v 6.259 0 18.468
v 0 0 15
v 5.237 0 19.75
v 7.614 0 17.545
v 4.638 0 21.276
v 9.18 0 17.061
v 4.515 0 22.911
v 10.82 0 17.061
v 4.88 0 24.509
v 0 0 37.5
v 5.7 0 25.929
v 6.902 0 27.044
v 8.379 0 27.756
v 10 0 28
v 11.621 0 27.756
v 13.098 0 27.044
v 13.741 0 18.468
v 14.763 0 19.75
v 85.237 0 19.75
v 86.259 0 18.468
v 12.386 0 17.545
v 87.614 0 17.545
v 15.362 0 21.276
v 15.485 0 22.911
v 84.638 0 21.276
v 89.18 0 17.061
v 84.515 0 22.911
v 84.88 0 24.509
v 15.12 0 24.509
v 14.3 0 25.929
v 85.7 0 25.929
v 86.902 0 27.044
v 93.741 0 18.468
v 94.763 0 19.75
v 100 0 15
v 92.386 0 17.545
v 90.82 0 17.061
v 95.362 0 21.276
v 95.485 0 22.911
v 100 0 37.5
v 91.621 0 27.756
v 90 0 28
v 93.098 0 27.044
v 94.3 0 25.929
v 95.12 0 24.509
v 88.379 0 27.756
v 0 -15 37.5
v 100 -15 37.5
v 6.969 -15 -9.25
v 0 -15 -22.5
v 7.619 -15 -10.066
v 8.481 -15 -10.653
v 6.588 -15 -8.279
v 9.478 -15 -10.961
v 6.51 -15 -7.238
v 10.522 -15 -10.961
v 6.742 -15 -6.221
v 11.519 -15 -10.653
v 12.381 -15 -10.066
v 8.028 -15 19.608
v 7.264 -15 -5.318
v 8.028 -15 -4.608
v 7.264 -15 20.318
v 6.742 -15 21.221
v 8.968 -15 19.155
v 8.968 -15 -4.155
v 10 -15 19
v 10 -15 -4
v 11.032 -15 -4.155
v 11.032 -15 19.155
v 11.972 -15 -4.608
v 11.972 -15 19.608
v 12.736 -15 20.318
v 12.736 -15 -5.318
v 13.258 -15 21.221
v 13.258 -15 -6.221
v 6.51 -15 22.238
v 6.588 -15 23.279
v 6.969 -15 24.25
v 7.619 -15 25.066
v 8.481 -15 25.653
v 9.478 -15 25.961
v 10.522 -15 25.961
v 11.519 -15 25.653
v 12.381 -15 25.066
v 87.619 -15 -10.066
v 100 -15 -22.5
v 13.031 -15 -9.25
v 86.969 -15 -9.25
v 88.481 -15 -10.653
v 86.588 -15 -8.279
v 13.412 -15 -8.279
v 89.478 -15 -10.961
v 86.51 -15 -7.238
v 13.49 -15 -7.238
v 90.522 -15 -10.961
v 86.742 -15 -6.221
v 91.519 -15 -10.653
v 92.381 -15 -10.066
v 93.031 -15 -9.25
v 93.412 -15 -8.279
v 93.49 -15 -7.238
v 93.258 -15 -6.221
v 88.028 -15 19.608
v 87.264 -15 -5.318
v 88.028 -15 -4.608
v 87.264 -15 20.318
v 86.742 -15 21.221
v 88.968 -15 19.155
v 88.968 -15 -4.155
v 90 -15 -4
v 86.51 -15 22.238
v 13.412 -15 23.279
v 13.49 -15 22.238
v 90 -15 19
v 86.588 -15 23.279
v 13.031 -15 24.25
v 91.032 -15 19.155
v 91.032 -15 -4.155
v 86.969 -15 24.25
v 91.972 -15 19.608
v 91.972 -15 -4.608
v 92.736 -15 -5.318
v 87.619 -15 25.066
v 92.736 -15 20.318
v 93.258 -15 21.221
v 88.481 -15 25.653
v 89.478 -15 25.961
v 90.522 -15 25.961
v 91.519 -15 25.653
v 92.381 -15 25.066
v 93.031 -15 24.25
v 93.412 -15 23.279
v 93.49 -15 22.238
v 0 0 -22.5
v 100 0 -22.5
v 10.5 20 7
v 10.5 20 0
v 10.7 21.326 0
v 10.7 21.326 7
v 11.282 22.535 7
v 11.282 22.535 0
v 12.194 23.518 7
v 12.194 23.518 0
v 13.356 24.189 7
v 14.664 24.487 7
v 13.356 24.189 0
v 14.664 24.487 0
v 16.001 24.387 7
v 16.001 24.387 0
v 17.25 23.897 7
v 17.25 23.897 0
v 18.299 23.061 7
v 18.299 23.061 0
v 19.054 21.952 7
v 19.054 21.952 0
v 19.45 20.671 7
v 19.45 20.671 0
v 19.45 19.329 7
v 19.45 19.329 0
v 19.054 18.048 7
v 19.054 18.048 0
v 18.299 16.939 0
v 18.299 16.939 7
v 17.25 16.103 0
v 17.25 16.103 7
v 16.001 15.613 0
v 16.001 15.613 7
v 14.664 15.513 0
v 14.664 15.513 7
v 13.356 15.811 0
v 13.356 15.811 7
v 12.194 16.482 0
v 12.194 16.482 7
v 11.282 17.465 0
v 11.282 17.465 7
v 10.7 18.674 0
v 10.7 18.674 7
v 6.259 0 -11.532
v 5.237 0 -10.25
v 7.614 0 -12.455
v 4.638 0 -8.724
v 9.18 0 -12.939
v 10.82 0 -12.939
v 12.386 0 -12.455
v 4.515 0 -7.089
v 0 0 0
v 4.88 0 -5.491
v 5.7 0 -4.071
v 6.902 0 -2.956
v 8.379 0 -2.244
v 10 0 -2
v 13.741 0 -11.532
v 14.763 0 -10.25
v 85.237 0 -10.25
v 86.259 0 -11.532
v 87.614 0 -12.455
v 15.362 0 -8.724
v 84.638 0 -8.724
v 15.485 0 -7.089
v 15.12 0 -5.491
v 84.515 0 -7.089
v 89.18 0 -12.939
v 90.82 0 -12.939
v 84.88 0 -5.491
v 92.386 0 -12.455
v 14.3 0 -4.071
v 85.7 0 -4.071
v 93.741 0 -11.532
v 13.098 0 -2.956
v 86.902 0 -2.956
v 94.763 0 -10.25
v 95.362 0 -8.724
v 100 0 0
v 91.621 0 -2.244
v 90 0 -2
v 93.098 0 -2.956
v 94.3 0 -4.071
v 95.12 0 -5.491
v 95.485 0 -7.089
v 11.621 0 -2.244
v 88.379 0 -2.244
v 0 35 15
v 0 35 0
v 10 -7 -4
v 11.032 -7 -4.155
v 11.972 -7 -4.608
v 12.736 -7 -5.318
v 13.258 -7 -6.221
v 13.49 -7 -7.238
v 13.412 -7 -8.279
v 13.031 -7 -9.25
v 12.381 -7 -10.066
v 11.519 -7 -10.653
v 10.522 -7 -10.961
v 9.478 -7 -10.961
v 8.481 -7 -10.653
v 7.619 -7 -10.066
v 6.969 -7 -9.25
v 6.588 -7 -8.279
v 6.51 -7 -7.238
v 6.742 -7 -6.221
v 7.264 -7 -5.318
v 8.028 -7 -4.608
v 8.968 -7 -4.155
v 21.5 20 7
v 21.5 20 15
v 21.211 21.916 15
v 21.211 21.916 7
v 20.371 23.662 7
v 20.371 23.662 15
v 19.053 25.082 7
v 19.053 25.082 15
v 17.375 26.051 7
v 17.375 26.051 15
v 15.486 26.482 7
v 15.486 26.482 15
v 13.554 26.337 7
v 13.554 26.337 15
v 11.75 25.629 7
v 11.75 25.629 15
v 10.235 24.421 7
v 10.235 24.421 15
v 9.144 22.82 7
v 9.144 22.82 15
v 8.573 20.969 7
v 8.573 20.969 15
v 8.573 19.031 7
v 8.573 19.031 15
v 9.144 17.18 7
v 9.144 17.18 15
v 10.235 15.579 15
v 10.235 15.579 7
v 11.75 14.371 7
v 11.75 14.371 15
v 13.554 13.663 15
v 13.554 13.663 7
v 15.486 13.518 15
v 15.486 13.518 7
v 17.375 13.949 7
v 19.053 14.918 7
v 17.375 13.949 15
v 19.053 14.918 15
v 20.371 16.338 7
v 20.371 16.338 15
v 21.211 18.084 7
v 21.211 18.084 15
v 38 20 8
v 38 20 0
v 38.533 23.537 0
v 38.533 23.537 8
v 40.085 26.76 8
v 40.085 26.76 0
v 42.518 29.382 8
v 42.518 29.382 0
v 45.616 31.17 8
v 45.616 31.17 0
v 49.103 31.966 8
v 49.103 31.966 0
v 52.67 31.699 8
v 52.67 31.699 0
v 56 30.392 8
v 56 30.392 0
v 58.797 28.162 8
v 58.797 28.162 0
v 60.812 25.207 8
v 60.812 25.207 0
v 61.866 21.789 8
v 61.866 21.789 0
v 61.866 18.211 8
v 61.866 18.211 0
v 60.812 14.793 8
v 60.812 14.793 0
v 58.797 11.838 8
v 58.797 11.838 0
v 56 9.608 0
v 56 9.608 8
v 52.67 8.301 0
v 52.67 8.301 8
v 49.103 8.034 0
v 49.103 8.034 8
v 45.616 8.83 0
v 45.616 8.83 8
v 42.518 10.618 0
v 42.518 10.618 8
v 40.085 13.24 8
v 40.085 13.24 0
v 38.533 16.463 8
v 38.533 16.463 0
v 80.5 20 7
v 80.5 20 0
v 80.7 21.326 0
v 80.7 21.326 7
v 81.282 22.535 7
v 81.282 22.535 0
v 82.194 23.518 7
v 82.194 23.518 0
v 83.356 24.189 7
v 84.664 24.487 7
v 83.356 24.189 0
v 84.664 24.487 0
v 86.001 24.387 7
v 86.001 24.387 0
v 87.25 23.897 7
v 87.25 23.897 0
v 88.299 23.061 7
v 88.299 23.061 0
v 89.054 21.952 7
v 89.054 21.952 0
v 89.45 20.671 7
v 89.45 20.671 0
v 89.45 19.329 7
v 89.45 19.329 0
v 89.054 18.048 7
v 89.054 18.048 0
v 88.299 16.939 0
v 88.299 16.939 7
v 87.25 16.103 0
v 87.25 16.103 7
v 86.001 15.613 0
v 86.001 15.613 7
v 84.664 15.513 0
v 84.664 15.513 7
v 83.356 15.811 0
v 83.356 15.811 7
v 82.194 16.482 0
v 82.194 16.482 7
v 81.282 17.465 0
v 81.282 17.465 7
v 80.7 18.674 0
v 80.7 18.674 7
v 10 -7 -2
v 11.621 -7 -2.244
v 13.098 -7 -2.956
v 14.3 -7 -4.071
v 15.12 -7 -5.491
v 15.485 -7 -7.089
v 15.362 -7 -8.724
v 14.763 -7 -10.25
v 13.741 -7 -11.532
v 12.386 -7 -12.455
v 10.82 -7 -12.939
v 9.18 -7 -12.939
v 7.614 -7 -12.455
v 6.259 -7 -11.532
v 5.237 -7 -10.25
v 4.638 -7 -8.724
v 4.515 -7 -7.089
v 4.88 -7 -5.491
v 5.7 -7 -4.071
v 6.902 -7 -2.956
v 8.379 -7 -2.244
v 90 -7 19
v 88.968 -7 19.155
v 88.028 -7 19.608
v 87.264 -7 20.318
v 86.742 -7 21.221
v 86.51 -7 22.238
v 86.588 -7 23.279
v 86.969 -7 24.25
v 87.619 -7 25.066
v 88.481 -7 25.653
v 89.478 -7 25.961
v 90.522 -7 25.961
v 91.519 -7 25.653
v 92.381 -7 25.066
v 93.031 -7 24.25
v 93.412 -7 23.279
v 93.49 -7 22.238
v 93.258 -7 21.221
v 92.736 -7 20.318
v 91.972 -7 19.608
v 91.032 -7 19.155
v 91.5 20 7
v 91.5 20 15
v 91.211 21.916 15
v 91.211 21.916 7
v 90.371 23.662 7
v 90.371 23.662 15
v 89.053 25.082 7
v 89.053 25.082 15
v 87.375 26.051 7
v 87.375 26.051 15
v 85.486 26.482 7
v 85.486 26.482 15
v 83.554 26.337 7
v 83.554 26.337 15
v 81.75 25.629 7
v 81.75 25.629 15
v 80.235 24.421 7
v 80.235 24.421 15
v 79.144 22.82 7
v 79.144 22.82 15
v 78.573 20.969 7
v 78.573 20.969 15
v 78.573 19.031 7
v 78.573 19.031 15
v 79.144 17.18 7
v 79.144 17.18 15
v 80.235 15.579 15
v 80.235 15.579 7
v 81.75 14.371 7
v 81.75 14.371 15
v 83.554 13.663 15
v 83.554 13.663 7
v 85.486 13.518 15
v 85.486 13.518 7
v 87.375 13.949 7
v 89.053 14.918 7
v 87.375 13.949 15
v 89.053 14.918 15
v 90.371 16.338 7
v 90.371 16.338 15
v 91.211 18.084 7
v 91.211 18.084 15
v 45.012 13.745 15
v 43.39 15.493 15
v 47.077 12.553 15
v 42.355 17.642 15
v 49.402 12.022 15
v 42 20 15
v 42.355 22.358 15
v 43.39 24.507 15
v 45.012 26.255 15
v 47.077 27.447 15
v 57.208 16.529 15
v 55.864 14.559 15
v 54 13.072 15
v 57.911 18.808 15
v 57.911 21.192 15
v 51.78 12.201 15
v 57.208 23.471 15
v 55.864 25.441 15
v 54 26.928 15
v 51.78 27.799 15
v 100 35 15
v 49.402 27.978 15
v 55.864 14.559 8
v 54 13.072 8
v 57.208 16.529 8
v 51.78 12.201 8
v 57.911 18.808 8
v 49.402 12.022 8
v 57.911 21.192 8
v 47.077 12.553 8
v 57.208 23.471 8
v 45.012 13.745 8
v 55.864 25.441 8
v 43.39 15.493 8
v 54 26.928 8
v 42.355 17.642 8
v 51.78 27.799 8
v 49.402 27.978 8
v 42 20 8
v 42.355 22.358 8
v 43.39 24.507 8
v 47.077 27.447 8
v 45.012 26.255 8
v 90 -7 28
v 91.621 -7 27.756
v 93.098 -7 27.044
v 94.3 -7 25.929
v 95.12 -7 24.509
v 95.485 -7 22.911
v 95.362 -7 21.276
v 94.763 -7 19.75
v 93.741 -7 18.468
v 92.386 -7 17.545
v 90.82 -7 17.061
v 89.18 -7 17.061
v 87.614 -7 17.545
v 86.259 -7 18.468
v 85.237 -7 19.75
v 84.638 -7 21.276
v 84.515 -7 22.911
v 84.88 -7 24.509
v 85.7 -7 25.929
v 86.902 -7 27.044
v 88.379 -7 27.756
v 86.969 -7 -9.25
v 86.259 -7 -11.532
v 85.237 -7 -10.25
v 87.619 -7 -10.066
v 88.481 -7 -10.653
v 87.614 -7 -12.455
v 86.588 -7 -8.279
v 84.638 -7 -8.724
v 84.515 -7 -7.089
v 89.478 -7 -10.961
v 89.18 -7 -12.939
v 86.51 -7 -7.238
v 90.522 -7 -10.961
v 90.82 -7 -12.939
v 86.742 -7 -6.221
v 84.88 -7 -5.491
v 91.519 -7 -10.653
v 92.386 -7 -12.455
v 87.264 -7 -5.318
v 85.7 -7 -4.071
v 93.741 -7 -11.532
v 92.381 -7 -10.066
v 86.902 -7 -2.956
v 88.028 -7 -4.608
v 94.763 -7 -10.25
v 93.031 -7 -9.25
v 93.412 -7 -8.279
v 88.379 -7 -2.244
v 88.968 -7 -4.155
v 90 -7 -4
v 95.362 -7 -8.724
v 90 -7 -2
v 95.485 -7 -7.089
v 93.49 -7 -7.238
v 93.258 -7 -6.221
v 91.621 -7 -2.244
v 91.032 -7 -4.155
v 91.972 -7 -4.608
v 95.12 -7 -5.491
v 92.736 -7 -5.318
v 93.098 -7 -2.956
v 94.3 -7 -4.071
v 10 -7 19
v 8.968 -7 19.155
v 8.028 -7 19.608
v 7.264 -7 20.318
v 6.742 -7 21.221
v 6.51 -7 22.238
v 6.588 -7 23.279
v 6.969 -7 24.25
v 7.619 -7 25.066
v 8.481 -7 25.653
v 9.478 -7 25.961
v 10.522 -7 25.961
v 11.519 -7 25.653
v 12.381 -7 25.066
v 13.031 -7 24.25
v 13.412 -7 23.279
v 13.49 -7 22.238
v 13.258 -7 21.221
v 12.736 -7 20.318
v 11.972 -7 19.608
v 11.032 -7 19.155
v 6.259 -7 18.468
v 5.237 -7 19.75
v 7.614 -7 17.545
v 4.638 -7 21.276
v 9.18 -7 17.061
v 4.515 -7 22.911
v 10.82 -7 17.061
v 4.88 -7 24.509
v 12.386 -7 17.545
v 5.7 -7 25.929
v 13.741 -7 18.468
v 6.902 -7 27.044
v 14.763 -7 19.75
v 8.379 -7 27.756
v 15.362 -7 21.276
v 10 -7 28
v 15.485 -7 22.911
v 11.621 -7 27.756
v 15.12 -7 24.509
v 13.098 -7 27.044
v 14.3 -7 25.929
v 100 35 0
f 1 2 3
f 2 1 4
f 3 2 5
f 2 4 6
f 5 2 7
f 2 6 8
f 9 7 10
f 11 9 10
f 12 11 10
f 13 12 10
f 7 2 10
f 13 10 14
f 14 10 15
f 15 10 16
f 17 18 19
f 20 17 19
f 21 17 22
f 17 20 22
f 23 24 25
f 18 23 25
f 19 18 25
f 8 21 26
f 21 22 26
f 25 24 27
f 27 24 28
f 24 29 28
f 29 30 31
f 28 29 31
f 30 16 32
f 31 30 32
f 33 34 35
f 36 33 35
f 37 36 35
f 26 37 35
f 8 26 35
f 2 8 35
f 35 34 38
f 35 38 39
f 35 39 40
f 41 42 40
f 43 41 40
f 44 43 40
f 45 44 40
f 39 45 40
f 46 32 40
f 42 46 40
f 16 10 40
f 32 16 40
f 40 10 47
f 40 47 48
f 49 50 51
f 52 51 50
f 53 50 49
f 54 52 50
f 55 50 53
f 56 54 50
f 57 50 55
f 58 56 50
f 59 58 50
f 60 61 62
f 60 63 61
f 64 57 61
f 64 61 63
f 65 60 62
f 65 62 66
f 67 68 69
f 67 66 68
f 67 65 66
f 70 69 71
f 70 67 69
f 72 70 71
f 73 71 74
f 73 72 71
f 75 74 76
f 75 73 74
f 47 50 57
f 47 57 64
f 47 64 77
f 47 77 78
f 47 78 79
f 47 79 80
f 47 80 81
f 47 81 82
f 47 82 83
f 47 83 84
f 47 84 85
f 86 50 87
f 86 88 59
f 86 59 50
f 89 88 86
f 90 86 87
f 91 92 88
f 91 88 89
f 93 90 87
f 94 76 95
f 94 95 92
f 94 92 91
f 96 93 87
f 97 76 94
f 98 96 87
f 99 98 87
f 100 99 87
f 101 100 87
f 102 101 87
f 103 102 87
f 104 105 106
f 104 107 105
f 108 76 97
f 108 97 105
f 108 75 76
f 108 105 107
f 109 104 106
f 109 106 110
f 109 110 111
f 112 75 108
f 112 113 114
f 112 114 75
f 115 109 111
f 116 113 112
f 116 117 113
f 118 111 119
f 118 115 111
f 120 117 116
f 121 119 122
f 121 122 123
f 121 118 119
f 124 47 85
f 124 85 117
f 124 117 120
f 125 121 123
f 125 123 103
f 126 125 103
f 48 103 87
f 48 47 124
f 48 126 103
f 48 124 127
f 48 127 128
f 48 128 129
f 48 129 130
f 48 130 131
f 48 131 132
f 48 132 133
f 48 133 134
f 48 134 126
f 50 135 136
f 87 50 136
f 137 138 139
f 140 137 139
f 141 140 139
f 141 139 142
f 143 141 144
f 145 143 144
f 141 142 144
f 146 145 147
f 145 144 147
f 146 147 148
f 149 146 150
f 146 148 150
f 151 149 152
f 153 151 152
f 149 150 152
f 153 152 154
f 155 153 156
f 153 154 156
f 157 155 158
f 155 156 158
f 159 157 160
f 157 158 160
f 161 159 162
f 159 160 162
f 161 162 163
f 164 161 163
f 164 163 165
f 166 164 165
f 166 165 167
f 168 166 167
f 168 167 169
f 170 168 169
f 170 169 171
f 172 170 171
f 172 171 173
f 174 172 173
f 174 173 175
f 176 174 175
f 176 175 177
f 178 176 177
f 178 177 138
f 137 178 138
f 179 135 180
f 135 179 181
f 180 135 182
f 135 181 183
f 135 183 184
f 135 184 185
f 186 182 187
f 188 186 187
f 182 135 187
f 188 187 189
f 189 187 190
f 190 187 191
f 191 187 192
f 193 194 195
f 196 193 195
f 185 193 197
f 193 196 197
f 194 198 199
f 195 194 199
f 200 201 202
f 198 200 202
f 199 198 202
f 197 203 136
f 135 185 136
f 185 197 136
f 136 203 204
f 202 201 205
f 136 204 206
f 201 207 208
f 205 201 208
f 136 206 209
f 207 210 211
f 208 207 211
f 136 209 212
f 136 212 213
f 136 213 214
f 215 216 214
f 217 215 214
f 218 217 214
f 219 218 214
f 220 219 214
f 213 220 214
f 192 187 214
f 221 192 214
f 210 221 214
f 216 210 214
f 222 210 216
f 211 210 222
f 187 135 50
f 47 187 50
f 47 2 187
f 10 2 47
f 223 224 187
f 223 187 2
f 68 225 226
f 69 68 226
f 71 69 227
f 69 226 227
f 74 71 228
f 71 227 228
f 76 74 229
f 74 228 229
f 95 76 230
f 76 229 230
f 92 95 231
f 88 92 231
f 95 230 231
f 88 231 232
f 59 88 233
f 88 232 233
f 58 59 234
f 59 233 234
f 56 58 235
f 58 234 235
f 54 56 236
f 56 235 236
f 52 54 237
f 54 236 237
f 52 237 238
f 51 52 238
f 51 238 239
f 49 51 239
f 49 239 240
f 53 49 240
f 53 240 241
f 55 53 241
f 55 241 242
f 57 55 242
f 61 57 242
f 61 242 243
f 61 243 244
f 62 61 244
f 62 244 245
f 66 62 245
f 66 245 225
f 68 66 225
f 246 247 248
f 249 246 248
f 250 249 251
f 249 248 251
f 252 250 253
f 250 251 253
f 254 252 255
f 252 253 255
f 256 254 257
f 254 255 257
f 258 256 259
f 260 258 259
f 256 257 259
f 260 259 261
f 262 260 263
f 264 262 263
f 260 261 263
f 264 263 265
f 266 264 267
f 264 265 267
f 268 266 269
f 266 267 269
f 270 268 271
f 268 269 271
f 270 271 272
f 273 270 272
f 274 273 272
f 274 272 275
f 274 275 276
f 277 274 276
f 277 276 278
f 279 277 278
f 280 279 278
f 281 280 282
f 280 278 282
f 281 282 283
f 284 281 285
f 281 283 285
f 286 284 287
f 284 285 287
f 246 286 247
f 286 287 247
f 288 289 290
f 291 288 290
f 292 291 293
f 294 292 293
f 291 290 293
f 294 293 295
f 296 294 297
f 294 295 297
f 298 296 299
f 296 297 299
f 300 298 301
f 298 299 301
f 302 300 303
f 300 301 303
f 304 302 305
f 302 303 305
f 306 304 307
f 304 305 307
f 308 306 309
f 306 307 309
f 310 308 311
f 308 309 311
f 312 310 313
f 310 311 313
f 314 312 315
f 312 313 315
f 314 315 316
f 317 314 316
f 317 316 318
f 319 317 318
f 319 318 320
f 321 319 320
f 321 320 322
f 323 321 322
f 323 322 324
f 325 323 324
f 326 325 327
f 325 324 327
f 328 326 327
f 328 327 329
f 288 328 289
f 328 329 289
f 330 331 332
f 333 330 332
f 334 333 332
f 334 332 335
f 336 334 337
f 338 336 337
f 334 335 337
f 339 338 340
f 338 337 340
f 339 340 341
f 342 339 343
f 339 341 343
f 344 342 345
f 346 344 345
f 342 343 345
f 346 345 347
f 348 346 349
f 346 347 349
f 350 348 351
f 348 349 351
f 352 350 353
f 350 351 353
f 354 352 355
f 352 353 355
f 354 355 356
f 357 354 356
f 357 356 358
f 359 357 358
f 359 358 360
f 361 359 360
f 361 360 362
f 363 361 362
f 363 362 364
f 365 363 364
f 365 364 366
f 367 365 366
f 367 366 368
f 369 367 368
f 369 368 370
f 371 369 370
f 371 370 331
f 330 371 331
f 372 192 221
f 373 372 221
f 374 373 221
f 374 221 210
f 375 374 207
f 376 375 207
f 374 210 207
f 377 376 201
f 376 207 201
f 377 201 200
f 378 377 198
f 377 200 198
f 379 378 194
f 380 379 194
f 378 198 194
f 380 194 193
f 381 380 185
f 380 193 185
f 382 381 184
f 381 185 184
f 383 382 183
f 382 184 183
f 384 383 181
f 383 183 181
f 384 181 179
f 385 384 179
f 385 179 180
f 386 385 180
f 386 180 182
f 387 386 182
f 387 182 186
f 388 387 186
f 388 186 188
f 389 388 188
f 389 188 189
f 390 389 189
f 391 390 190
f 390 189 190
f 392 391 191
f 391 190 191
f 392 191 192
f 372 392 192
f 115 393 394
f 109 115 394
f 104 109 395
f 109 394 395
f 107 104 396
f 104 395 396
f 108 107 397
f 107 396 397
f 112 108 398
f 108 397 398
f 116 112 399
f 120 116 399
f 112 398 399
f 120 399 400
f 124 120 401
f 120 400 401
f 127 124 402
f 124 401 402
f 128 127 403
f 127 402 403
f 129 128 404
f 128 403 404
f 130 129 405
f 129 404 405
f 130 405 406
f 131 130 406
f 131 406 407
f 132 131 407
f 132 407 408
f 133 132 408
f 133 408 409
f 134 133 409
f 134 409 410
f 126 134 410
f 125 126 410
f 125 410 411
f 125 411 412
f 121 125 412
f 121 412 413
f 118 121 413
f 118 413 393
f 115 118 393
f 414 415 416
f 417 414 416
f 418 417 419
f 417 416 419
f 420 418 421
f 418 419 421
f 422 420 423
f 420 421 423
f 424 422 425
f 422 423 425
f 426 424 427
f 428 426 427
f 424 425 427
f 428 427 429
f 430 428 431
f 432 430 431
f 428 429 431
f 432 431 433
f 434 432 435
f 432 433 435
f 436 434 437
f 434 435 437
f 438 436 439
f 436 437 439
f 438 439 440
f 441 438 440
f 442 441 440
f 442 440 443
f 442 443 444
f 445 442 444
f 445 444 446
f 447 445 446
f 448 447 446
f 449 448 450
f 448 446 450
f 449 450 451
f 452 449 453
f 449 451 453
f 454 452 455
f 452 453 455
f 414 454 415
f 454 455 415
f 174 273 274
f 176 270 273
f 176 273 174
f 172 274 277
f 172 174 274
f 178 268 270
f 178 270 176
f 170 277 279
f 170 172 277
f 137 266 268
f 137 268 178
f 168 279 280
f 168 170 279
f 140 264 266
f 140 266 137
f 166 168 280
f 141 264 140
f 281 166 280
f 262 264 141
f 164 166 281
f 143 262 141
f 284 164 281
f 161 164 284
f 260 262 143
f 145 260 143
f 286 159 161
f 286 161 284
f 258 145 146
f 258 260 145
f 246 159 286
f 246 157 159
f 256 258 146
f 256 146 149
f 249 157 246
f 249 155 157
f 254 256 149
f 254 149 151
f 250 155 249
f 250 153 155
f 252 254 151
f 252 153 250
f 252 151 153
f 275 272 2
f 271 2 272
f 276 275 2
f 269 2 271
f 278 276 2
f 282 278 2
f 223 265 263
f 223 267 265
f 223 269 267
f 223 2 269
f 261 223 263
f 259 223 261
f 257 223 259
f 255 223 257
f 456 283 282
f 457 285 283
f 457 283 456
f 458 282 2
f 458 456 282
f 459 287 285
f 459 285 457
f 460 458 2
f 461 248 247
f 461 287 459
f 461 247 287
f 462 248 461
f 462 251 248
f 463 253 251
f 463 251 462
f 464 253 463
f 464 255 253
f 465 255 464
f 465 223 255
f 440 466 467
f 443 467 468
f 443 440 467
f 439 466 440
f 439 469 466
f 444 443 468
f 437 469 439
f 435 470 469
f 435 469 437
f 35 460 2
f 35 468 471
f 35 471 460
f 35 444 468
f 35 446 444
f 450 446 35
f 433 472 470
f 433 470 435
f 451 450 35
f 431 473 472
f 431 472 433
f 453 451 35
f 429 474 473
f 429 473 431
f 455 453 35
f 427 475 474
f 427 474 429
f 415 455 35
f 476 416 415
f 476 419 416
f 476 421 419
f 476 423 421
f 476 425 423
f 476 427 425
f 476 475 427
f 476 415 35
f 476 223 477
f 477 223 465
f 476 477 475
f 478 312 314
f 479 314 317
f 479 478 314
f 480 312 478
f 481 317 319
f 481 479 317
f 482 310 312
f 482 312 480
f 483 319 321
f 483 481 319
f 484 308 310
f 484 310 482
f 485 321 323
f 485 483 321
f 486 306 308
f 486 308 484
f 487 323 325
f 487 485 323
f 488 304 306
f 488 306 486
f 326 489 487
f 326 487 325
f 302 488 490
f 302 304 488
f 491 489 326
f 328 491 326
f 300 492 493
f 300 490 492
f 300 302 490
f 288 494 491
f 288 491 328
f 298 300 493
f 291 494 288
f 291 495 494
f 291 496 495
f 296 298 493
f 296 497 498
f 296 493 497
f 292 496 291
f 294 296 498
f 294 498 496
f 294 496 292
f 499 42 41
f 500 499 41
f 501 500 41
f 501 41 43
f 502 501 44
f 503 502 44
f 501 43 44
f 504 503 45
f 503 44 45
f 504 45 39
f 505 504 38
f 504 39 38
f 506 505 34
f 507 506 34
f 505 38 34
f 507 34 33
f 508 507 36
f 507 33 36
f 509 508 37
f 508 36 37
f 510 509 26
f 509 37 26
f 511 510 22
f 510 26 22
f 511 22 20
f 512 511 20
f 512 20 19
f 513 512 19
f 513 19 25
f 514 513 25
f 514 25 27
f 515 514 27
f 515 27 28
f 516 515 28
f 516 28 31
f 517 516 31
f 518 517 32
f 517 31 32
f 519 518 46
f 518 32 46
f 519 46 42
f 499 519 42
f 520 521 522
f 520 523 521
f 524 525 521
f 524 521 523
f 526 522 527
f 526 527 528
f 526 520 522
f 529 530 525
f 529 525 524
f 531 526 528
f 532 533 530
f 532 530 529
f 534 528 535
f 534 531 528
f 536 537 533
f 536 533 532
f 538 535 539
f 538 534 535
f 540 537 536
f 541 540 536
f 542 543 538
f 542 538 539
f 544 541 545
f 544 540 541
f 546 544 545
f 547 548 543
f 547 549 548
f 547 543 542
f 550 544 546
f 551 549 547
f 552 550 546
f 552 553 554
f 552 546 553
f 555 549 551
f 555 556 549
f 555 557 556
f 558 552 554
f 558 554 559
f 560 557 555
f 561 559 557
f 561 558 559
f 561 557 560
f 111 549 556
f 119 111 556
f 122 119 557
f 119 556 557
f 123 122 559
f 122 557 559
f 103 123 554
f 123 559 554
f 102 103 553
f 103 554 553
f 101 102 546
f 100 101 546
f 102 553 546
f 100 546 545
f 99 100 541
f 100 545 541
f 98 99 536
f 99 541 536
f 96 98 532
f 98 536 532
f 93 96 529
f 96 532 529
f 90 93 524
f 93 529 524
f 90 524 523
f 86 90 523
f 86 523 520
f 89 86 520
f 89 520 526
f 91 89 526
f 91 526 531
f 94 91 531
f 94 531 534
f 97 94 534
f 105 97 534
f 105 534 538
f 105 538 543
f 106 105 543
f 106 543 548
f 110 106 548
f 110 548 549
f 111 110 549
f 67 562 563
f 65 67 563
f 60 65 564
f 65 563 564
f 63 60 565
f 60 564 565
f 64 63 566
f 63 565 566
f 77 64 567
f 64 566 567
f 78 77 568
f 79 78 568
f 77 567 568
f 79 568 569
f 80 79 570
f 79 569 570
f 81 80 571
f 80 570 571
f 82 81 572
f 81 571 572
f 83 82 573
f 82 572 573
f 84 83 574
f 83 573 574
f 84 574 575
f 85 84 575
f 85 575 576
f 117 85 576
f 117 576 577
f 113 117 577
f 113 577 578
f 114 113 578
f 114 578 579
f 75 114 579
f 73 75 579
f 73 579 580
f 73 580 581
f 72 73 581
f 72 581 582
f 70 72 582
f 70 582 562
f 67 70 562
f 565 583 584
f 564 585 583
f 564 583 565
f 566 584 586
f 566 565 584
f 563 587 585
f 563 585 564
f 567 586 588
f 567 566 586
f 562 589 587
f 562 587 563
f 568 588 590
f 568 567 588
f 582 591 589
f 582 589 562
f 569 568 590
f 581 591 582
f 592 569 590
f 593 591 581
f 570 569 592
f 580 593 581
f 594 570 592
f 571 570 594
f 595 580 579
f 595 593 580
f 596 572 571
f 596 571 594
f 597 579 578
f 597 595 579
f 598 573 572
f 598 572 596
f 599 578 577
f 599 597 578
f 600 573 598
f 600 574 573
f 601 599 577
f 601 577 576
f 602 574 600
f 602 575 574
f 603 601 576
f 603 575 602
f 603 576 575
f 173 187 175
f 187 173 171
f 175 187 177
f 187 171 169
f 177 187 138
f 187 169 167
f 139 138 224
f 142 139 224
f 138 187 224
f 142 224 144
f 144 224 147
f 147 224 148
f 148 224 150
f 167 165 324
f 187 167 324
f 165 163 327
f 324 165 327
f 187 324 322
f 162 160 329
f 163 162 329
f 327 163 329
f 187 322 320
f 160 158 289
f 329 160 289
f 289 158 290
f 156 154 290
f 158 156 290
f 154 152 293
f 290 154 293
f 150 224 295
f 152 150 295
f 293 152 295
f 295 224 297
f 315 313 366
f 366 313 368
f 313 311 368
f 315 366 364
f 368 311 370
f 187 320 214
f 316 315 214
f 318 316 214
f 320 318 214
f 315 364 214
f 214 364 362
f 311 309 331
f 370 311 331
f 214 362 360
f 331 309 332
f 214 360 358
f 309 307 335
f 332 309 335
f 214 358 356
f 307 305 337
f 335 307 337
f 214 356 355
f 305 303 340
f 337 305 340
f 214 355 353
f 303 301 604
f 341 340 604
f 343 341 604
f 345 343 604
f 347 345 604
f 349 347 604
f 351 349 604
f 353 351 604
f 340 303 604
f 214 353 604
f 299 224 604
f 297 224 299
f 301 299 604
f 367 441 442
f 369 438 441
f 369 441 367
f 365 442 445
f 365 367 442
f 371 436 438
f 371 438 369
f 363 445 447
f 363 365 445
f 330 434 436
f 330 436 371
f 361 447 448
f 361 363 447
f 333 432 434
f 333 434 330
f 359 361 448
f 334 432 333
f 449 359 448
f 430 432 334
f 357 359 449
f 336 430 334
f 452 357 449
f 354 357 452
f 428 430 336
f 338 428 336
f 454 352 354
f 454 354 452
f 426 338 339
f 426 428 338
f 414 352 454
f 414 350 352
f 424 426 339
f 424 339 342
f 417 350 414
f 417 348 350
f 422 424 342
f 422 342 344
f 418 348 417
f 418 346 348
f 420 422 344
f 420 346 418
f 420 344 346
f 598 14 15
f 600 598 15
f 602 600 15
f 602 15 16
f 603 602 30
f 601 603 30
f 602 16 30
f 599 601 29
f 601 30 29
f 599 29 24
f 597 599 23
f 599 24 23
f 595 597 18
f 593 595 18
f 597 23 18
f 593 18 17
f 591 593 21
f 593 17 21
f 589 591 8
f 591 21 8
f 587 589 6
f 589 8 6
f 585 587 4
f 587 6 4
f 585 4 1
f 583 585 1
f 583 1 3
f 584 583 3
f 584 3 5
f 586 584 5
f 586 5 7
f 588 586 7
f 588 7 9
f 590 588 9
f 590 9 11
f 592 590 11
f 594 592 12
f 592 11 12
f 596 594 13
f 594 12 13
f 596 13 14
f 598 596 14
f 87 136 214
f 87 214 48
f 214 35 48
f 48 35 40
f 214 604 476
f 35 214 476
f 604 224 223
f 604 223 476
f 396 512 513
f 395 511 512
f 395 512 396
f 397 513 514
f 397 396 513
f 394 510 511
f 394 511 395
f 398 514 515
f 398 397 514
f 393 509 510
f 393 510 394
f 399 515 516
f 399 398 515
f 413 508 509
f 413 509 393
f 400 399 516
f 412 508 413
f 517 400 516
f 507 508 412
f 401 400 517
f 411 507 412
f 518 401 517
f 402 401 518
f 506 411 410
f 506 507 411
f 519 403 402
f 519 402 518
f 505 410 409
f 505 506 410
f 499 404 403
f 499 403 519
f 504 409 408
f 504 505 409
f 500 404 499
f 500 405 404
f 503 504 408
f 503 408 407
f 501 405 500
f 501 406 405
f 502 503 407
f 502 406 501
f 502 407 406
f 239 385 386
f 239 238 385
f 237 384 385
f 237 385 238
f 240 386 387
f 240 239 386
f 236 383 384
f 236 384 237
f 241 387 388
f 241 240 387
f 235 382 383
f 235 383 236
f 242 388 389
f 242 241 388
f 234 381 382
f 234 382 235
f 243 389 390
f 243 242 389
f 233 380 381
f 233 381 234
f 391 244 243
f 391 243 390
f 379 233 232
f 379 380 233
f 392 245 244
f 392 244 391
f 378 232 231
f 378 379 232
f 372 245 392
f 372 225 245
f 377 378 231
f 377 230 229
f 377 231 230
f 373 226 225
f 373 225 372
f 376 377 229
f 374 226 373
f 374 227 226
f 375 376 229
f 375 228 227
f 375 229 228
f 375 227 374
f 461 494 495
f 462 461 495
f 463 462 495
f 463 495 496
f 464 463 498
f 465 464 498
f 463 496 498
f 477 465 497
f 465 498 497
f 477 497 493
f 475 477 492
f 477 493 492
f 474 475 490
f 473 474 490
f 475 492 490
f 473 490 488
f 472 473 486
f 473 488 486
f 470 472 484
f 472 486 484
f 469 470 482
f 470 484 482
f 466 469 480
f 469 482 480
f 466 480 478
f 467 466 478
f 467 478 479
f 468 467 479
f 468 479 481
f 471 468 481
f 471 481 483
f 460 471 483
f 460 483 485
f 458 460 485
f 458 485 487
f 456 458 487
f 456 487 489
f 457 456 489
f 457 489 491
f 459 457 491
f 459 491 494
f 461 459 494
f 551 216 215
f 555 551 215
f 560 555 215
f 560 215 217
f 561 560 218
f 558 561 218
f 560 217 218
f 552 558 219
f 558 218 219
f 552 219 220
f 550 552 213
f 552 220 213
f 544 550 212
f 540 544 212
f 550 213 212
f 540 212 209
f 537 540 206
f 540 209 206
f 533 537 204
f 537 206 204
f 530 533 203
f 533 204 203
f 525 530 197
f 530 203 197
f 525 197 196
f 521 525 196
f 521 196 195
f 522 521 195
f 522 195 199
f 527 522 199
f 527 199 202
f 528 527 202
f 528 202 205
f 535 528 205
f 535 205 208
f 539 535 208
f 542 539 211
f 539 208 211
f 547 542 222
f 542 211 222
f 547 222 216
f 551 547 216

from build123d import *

# Parameters (mm, degrees)
SKETCH_1_W          = 100
SKETCH_1_H          = 35
EXTRUDE_1_DEPTH     = 15
SKETCH_2_W          = 100
SKETCH_2_H          = 60
EXTRUDE_2_DEPTH     = 15
SKETCH_3_R          = 3.5
CUT_EXTRUDE_1_DEPTH = 113.388833965
SKETCH_4_R          = 5.5
CUT_EXTRUDE_2_DEPTH = 7
SKETCH_5_R          = 4.5
SKETCH_5_R_2        = 8
CUT_EXTRUDE_3_DEPTH = 113.388833965
SKETCH_6_R          = 12
CUT_EXTRUDE_4_DEPTH = 8
SKETCH_7_R          = 6.5
CUT_EXTRUDE_5_DEPTH = 8


with BuildPart() as part:
    # 草图1 → 凸台-拉伸1 (new body)
    with BuildSketch(Plane.XY):
        with Locations((50, 17.5)):
            Rectangle(SKETCH_1_W, SKETCH_1_H)
    extrude(amount=EXTRUDE_1_DEPTH)

    # 草图2 → 凸台-拉伸2 (add)
    with BuildSketch(Plane.XZ):
        with Locations((50, 7.5)):
            Rectangle(SKETCH_2_W, SKETCH_2_H)
    extrude(amount=EXTRUDE_2_DEPTH)

    # 草图3 → 切除-拉伸1 (cut, through all)
    with BuildSketch(Plane(origin=(0, 0, 0), x_dir=(1, 0, 0), z_dir=(0, 1, 0))):
        with Locations(Location((10, 7.5, 0), (0, 0, 270))):
            Circle(SKETCH_3_R)
        with Locations(Location((90, 7.5, 0), (0, 0, 270))):
            Circle(SKETCH_3_R)
        with Locations(Location((90, -22.5, 0), (0, 0, 90))):
            Circle(SKETCH_3_R)
        with Locations(Location((10, -22.5, 0), (0, 0, 90))):
            Circle(SKETCH_3_R)
    extrude(amount=-CUT_EXTRUDE_1_DEPTH, mode=Mode.SUBTRACT)

    # 草图4 → 切除-拉伸2 (cut)
    with BuildSketch(Plane(origin=(0, 0, 0), x_dir=(1, 0, 0), z_dir=(0, 1, 0))):
        with Locations(Location((10, 7.5, 0), (0, 0, 270))):
            Circle(SKETCH_4_R)
        with Locations(Location((90, 7.5, 0), (0, 0, 270))):
            Circle(SKETCH_4_R)
        with Locations(Location((10, -22.5, 0), (0, 0, 270))):
            Circle(SKETCH_4_R)
        with Locations(Location((90, -22.5, 0), (0, 0, 270))):
            Circle(SKETCH_4_R)
    extrude(amount=-CUT_EXTRUDE_2_DEPTH, mode=Mode.SUBTRACT)

    # 草图5 → 切除-拉伸3 (cut, through all)
    with BuildSketch(Plane(origin=(0, 0, 0), x_dir=(-1, 0, 0), z_dir=(0, 0, -1))):
        with Locations((-85, 20)):
            Circle(SKETCH_5_R)
        with Locations((-15, 20)):
            Circle(SKETCH_5_R)
        with Locations((-50, 20)):
            Circle(SKETCH_5_R_2)
    extrude(amount=-CUT_EXTRUDE_3_DEPTH, mode=Mode.SUBTRACT)

    # 草图6 → 切除-拉伸4 (cut)
    with BuildSketch(Plane(origin=(0, 0, 0), x_dir=(-1, 0, 0), z_dir=(0, 0, -1))):
        with Locations((-50, 20)):
            Circle(SKETCH_6_R)
    extrude(amount=-CUT_EXTRUDE_4_DEPTH, mode=Mode.SUBTRACT)

    # 草图7 → 切除-拉伸5 (cut)
    with BuildSketch(Plane.XY.offset(15)):
        with Locations((15, 20)):
            Circle(SKETCH_7_R)
        with Locations((85, 20)):
            Circle(SKETCH_7_R)
    extrude(amount=-CUT_EXTRUDE_5_DEPTH, mode=Mode.SUBTRACT)


solid = part.part
